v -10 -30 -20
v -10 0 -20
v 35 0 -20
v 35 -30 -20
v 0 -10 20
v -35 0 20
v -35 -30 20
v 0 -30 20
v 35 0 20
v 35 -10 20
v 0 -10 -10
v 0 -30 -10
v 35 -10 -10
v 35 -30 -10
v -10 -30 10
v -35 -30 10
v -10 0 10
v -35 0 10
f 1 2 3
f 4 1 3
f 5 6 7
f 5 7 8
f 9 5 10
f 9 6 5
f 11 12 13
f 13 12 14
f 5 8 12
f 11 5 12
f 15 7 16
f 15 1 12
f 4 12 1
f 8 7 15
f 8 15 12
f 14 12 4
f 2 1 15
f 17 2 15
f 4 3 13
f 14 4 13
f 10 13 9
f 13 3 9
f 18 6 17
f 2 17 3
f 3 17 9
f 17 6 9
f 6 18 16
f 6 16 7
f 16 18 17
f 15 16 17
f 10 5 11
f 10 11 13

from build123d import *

# Parameters (mm, degrees)
F0_W     = 70
F0_H     = 40
F1_DEPTH = 30
F3_DEPTH = 20
F4_W     = 25
F4_H     = 30
F5_DEPTH = 30.001


with BuildPart() as f1:
    # F0 (on Front) → F1 (new body)
    with BuildSketch(Plane.XZ):
        Rectangle(F0_W, F0_H)
    extrude(amount=F1_DEPTH)

    # F2 (on face) → F3 (cut)
    with BuildSketch(Plane.XZ.offset(30)):
        Polygon((35, 0), (35, 20), (0, 20), (0, 4.09944), (0, 0), (0, -10), (35, -10), align=None)
    extrude(amount=-F3_DEPTH, mode=Mode.SUBTRACT)

    # F4 (on face) → F5 (cut, through all)
    with BuildSketch(Plane.XZ.offset(30)):
        with Locations((-22.5, -5)):
            Rectangle(F4_W, F4_H)
    extrude(amount=-F5_DEPTH, mode=Mode.SUBTRACT)


solid = f1.part
